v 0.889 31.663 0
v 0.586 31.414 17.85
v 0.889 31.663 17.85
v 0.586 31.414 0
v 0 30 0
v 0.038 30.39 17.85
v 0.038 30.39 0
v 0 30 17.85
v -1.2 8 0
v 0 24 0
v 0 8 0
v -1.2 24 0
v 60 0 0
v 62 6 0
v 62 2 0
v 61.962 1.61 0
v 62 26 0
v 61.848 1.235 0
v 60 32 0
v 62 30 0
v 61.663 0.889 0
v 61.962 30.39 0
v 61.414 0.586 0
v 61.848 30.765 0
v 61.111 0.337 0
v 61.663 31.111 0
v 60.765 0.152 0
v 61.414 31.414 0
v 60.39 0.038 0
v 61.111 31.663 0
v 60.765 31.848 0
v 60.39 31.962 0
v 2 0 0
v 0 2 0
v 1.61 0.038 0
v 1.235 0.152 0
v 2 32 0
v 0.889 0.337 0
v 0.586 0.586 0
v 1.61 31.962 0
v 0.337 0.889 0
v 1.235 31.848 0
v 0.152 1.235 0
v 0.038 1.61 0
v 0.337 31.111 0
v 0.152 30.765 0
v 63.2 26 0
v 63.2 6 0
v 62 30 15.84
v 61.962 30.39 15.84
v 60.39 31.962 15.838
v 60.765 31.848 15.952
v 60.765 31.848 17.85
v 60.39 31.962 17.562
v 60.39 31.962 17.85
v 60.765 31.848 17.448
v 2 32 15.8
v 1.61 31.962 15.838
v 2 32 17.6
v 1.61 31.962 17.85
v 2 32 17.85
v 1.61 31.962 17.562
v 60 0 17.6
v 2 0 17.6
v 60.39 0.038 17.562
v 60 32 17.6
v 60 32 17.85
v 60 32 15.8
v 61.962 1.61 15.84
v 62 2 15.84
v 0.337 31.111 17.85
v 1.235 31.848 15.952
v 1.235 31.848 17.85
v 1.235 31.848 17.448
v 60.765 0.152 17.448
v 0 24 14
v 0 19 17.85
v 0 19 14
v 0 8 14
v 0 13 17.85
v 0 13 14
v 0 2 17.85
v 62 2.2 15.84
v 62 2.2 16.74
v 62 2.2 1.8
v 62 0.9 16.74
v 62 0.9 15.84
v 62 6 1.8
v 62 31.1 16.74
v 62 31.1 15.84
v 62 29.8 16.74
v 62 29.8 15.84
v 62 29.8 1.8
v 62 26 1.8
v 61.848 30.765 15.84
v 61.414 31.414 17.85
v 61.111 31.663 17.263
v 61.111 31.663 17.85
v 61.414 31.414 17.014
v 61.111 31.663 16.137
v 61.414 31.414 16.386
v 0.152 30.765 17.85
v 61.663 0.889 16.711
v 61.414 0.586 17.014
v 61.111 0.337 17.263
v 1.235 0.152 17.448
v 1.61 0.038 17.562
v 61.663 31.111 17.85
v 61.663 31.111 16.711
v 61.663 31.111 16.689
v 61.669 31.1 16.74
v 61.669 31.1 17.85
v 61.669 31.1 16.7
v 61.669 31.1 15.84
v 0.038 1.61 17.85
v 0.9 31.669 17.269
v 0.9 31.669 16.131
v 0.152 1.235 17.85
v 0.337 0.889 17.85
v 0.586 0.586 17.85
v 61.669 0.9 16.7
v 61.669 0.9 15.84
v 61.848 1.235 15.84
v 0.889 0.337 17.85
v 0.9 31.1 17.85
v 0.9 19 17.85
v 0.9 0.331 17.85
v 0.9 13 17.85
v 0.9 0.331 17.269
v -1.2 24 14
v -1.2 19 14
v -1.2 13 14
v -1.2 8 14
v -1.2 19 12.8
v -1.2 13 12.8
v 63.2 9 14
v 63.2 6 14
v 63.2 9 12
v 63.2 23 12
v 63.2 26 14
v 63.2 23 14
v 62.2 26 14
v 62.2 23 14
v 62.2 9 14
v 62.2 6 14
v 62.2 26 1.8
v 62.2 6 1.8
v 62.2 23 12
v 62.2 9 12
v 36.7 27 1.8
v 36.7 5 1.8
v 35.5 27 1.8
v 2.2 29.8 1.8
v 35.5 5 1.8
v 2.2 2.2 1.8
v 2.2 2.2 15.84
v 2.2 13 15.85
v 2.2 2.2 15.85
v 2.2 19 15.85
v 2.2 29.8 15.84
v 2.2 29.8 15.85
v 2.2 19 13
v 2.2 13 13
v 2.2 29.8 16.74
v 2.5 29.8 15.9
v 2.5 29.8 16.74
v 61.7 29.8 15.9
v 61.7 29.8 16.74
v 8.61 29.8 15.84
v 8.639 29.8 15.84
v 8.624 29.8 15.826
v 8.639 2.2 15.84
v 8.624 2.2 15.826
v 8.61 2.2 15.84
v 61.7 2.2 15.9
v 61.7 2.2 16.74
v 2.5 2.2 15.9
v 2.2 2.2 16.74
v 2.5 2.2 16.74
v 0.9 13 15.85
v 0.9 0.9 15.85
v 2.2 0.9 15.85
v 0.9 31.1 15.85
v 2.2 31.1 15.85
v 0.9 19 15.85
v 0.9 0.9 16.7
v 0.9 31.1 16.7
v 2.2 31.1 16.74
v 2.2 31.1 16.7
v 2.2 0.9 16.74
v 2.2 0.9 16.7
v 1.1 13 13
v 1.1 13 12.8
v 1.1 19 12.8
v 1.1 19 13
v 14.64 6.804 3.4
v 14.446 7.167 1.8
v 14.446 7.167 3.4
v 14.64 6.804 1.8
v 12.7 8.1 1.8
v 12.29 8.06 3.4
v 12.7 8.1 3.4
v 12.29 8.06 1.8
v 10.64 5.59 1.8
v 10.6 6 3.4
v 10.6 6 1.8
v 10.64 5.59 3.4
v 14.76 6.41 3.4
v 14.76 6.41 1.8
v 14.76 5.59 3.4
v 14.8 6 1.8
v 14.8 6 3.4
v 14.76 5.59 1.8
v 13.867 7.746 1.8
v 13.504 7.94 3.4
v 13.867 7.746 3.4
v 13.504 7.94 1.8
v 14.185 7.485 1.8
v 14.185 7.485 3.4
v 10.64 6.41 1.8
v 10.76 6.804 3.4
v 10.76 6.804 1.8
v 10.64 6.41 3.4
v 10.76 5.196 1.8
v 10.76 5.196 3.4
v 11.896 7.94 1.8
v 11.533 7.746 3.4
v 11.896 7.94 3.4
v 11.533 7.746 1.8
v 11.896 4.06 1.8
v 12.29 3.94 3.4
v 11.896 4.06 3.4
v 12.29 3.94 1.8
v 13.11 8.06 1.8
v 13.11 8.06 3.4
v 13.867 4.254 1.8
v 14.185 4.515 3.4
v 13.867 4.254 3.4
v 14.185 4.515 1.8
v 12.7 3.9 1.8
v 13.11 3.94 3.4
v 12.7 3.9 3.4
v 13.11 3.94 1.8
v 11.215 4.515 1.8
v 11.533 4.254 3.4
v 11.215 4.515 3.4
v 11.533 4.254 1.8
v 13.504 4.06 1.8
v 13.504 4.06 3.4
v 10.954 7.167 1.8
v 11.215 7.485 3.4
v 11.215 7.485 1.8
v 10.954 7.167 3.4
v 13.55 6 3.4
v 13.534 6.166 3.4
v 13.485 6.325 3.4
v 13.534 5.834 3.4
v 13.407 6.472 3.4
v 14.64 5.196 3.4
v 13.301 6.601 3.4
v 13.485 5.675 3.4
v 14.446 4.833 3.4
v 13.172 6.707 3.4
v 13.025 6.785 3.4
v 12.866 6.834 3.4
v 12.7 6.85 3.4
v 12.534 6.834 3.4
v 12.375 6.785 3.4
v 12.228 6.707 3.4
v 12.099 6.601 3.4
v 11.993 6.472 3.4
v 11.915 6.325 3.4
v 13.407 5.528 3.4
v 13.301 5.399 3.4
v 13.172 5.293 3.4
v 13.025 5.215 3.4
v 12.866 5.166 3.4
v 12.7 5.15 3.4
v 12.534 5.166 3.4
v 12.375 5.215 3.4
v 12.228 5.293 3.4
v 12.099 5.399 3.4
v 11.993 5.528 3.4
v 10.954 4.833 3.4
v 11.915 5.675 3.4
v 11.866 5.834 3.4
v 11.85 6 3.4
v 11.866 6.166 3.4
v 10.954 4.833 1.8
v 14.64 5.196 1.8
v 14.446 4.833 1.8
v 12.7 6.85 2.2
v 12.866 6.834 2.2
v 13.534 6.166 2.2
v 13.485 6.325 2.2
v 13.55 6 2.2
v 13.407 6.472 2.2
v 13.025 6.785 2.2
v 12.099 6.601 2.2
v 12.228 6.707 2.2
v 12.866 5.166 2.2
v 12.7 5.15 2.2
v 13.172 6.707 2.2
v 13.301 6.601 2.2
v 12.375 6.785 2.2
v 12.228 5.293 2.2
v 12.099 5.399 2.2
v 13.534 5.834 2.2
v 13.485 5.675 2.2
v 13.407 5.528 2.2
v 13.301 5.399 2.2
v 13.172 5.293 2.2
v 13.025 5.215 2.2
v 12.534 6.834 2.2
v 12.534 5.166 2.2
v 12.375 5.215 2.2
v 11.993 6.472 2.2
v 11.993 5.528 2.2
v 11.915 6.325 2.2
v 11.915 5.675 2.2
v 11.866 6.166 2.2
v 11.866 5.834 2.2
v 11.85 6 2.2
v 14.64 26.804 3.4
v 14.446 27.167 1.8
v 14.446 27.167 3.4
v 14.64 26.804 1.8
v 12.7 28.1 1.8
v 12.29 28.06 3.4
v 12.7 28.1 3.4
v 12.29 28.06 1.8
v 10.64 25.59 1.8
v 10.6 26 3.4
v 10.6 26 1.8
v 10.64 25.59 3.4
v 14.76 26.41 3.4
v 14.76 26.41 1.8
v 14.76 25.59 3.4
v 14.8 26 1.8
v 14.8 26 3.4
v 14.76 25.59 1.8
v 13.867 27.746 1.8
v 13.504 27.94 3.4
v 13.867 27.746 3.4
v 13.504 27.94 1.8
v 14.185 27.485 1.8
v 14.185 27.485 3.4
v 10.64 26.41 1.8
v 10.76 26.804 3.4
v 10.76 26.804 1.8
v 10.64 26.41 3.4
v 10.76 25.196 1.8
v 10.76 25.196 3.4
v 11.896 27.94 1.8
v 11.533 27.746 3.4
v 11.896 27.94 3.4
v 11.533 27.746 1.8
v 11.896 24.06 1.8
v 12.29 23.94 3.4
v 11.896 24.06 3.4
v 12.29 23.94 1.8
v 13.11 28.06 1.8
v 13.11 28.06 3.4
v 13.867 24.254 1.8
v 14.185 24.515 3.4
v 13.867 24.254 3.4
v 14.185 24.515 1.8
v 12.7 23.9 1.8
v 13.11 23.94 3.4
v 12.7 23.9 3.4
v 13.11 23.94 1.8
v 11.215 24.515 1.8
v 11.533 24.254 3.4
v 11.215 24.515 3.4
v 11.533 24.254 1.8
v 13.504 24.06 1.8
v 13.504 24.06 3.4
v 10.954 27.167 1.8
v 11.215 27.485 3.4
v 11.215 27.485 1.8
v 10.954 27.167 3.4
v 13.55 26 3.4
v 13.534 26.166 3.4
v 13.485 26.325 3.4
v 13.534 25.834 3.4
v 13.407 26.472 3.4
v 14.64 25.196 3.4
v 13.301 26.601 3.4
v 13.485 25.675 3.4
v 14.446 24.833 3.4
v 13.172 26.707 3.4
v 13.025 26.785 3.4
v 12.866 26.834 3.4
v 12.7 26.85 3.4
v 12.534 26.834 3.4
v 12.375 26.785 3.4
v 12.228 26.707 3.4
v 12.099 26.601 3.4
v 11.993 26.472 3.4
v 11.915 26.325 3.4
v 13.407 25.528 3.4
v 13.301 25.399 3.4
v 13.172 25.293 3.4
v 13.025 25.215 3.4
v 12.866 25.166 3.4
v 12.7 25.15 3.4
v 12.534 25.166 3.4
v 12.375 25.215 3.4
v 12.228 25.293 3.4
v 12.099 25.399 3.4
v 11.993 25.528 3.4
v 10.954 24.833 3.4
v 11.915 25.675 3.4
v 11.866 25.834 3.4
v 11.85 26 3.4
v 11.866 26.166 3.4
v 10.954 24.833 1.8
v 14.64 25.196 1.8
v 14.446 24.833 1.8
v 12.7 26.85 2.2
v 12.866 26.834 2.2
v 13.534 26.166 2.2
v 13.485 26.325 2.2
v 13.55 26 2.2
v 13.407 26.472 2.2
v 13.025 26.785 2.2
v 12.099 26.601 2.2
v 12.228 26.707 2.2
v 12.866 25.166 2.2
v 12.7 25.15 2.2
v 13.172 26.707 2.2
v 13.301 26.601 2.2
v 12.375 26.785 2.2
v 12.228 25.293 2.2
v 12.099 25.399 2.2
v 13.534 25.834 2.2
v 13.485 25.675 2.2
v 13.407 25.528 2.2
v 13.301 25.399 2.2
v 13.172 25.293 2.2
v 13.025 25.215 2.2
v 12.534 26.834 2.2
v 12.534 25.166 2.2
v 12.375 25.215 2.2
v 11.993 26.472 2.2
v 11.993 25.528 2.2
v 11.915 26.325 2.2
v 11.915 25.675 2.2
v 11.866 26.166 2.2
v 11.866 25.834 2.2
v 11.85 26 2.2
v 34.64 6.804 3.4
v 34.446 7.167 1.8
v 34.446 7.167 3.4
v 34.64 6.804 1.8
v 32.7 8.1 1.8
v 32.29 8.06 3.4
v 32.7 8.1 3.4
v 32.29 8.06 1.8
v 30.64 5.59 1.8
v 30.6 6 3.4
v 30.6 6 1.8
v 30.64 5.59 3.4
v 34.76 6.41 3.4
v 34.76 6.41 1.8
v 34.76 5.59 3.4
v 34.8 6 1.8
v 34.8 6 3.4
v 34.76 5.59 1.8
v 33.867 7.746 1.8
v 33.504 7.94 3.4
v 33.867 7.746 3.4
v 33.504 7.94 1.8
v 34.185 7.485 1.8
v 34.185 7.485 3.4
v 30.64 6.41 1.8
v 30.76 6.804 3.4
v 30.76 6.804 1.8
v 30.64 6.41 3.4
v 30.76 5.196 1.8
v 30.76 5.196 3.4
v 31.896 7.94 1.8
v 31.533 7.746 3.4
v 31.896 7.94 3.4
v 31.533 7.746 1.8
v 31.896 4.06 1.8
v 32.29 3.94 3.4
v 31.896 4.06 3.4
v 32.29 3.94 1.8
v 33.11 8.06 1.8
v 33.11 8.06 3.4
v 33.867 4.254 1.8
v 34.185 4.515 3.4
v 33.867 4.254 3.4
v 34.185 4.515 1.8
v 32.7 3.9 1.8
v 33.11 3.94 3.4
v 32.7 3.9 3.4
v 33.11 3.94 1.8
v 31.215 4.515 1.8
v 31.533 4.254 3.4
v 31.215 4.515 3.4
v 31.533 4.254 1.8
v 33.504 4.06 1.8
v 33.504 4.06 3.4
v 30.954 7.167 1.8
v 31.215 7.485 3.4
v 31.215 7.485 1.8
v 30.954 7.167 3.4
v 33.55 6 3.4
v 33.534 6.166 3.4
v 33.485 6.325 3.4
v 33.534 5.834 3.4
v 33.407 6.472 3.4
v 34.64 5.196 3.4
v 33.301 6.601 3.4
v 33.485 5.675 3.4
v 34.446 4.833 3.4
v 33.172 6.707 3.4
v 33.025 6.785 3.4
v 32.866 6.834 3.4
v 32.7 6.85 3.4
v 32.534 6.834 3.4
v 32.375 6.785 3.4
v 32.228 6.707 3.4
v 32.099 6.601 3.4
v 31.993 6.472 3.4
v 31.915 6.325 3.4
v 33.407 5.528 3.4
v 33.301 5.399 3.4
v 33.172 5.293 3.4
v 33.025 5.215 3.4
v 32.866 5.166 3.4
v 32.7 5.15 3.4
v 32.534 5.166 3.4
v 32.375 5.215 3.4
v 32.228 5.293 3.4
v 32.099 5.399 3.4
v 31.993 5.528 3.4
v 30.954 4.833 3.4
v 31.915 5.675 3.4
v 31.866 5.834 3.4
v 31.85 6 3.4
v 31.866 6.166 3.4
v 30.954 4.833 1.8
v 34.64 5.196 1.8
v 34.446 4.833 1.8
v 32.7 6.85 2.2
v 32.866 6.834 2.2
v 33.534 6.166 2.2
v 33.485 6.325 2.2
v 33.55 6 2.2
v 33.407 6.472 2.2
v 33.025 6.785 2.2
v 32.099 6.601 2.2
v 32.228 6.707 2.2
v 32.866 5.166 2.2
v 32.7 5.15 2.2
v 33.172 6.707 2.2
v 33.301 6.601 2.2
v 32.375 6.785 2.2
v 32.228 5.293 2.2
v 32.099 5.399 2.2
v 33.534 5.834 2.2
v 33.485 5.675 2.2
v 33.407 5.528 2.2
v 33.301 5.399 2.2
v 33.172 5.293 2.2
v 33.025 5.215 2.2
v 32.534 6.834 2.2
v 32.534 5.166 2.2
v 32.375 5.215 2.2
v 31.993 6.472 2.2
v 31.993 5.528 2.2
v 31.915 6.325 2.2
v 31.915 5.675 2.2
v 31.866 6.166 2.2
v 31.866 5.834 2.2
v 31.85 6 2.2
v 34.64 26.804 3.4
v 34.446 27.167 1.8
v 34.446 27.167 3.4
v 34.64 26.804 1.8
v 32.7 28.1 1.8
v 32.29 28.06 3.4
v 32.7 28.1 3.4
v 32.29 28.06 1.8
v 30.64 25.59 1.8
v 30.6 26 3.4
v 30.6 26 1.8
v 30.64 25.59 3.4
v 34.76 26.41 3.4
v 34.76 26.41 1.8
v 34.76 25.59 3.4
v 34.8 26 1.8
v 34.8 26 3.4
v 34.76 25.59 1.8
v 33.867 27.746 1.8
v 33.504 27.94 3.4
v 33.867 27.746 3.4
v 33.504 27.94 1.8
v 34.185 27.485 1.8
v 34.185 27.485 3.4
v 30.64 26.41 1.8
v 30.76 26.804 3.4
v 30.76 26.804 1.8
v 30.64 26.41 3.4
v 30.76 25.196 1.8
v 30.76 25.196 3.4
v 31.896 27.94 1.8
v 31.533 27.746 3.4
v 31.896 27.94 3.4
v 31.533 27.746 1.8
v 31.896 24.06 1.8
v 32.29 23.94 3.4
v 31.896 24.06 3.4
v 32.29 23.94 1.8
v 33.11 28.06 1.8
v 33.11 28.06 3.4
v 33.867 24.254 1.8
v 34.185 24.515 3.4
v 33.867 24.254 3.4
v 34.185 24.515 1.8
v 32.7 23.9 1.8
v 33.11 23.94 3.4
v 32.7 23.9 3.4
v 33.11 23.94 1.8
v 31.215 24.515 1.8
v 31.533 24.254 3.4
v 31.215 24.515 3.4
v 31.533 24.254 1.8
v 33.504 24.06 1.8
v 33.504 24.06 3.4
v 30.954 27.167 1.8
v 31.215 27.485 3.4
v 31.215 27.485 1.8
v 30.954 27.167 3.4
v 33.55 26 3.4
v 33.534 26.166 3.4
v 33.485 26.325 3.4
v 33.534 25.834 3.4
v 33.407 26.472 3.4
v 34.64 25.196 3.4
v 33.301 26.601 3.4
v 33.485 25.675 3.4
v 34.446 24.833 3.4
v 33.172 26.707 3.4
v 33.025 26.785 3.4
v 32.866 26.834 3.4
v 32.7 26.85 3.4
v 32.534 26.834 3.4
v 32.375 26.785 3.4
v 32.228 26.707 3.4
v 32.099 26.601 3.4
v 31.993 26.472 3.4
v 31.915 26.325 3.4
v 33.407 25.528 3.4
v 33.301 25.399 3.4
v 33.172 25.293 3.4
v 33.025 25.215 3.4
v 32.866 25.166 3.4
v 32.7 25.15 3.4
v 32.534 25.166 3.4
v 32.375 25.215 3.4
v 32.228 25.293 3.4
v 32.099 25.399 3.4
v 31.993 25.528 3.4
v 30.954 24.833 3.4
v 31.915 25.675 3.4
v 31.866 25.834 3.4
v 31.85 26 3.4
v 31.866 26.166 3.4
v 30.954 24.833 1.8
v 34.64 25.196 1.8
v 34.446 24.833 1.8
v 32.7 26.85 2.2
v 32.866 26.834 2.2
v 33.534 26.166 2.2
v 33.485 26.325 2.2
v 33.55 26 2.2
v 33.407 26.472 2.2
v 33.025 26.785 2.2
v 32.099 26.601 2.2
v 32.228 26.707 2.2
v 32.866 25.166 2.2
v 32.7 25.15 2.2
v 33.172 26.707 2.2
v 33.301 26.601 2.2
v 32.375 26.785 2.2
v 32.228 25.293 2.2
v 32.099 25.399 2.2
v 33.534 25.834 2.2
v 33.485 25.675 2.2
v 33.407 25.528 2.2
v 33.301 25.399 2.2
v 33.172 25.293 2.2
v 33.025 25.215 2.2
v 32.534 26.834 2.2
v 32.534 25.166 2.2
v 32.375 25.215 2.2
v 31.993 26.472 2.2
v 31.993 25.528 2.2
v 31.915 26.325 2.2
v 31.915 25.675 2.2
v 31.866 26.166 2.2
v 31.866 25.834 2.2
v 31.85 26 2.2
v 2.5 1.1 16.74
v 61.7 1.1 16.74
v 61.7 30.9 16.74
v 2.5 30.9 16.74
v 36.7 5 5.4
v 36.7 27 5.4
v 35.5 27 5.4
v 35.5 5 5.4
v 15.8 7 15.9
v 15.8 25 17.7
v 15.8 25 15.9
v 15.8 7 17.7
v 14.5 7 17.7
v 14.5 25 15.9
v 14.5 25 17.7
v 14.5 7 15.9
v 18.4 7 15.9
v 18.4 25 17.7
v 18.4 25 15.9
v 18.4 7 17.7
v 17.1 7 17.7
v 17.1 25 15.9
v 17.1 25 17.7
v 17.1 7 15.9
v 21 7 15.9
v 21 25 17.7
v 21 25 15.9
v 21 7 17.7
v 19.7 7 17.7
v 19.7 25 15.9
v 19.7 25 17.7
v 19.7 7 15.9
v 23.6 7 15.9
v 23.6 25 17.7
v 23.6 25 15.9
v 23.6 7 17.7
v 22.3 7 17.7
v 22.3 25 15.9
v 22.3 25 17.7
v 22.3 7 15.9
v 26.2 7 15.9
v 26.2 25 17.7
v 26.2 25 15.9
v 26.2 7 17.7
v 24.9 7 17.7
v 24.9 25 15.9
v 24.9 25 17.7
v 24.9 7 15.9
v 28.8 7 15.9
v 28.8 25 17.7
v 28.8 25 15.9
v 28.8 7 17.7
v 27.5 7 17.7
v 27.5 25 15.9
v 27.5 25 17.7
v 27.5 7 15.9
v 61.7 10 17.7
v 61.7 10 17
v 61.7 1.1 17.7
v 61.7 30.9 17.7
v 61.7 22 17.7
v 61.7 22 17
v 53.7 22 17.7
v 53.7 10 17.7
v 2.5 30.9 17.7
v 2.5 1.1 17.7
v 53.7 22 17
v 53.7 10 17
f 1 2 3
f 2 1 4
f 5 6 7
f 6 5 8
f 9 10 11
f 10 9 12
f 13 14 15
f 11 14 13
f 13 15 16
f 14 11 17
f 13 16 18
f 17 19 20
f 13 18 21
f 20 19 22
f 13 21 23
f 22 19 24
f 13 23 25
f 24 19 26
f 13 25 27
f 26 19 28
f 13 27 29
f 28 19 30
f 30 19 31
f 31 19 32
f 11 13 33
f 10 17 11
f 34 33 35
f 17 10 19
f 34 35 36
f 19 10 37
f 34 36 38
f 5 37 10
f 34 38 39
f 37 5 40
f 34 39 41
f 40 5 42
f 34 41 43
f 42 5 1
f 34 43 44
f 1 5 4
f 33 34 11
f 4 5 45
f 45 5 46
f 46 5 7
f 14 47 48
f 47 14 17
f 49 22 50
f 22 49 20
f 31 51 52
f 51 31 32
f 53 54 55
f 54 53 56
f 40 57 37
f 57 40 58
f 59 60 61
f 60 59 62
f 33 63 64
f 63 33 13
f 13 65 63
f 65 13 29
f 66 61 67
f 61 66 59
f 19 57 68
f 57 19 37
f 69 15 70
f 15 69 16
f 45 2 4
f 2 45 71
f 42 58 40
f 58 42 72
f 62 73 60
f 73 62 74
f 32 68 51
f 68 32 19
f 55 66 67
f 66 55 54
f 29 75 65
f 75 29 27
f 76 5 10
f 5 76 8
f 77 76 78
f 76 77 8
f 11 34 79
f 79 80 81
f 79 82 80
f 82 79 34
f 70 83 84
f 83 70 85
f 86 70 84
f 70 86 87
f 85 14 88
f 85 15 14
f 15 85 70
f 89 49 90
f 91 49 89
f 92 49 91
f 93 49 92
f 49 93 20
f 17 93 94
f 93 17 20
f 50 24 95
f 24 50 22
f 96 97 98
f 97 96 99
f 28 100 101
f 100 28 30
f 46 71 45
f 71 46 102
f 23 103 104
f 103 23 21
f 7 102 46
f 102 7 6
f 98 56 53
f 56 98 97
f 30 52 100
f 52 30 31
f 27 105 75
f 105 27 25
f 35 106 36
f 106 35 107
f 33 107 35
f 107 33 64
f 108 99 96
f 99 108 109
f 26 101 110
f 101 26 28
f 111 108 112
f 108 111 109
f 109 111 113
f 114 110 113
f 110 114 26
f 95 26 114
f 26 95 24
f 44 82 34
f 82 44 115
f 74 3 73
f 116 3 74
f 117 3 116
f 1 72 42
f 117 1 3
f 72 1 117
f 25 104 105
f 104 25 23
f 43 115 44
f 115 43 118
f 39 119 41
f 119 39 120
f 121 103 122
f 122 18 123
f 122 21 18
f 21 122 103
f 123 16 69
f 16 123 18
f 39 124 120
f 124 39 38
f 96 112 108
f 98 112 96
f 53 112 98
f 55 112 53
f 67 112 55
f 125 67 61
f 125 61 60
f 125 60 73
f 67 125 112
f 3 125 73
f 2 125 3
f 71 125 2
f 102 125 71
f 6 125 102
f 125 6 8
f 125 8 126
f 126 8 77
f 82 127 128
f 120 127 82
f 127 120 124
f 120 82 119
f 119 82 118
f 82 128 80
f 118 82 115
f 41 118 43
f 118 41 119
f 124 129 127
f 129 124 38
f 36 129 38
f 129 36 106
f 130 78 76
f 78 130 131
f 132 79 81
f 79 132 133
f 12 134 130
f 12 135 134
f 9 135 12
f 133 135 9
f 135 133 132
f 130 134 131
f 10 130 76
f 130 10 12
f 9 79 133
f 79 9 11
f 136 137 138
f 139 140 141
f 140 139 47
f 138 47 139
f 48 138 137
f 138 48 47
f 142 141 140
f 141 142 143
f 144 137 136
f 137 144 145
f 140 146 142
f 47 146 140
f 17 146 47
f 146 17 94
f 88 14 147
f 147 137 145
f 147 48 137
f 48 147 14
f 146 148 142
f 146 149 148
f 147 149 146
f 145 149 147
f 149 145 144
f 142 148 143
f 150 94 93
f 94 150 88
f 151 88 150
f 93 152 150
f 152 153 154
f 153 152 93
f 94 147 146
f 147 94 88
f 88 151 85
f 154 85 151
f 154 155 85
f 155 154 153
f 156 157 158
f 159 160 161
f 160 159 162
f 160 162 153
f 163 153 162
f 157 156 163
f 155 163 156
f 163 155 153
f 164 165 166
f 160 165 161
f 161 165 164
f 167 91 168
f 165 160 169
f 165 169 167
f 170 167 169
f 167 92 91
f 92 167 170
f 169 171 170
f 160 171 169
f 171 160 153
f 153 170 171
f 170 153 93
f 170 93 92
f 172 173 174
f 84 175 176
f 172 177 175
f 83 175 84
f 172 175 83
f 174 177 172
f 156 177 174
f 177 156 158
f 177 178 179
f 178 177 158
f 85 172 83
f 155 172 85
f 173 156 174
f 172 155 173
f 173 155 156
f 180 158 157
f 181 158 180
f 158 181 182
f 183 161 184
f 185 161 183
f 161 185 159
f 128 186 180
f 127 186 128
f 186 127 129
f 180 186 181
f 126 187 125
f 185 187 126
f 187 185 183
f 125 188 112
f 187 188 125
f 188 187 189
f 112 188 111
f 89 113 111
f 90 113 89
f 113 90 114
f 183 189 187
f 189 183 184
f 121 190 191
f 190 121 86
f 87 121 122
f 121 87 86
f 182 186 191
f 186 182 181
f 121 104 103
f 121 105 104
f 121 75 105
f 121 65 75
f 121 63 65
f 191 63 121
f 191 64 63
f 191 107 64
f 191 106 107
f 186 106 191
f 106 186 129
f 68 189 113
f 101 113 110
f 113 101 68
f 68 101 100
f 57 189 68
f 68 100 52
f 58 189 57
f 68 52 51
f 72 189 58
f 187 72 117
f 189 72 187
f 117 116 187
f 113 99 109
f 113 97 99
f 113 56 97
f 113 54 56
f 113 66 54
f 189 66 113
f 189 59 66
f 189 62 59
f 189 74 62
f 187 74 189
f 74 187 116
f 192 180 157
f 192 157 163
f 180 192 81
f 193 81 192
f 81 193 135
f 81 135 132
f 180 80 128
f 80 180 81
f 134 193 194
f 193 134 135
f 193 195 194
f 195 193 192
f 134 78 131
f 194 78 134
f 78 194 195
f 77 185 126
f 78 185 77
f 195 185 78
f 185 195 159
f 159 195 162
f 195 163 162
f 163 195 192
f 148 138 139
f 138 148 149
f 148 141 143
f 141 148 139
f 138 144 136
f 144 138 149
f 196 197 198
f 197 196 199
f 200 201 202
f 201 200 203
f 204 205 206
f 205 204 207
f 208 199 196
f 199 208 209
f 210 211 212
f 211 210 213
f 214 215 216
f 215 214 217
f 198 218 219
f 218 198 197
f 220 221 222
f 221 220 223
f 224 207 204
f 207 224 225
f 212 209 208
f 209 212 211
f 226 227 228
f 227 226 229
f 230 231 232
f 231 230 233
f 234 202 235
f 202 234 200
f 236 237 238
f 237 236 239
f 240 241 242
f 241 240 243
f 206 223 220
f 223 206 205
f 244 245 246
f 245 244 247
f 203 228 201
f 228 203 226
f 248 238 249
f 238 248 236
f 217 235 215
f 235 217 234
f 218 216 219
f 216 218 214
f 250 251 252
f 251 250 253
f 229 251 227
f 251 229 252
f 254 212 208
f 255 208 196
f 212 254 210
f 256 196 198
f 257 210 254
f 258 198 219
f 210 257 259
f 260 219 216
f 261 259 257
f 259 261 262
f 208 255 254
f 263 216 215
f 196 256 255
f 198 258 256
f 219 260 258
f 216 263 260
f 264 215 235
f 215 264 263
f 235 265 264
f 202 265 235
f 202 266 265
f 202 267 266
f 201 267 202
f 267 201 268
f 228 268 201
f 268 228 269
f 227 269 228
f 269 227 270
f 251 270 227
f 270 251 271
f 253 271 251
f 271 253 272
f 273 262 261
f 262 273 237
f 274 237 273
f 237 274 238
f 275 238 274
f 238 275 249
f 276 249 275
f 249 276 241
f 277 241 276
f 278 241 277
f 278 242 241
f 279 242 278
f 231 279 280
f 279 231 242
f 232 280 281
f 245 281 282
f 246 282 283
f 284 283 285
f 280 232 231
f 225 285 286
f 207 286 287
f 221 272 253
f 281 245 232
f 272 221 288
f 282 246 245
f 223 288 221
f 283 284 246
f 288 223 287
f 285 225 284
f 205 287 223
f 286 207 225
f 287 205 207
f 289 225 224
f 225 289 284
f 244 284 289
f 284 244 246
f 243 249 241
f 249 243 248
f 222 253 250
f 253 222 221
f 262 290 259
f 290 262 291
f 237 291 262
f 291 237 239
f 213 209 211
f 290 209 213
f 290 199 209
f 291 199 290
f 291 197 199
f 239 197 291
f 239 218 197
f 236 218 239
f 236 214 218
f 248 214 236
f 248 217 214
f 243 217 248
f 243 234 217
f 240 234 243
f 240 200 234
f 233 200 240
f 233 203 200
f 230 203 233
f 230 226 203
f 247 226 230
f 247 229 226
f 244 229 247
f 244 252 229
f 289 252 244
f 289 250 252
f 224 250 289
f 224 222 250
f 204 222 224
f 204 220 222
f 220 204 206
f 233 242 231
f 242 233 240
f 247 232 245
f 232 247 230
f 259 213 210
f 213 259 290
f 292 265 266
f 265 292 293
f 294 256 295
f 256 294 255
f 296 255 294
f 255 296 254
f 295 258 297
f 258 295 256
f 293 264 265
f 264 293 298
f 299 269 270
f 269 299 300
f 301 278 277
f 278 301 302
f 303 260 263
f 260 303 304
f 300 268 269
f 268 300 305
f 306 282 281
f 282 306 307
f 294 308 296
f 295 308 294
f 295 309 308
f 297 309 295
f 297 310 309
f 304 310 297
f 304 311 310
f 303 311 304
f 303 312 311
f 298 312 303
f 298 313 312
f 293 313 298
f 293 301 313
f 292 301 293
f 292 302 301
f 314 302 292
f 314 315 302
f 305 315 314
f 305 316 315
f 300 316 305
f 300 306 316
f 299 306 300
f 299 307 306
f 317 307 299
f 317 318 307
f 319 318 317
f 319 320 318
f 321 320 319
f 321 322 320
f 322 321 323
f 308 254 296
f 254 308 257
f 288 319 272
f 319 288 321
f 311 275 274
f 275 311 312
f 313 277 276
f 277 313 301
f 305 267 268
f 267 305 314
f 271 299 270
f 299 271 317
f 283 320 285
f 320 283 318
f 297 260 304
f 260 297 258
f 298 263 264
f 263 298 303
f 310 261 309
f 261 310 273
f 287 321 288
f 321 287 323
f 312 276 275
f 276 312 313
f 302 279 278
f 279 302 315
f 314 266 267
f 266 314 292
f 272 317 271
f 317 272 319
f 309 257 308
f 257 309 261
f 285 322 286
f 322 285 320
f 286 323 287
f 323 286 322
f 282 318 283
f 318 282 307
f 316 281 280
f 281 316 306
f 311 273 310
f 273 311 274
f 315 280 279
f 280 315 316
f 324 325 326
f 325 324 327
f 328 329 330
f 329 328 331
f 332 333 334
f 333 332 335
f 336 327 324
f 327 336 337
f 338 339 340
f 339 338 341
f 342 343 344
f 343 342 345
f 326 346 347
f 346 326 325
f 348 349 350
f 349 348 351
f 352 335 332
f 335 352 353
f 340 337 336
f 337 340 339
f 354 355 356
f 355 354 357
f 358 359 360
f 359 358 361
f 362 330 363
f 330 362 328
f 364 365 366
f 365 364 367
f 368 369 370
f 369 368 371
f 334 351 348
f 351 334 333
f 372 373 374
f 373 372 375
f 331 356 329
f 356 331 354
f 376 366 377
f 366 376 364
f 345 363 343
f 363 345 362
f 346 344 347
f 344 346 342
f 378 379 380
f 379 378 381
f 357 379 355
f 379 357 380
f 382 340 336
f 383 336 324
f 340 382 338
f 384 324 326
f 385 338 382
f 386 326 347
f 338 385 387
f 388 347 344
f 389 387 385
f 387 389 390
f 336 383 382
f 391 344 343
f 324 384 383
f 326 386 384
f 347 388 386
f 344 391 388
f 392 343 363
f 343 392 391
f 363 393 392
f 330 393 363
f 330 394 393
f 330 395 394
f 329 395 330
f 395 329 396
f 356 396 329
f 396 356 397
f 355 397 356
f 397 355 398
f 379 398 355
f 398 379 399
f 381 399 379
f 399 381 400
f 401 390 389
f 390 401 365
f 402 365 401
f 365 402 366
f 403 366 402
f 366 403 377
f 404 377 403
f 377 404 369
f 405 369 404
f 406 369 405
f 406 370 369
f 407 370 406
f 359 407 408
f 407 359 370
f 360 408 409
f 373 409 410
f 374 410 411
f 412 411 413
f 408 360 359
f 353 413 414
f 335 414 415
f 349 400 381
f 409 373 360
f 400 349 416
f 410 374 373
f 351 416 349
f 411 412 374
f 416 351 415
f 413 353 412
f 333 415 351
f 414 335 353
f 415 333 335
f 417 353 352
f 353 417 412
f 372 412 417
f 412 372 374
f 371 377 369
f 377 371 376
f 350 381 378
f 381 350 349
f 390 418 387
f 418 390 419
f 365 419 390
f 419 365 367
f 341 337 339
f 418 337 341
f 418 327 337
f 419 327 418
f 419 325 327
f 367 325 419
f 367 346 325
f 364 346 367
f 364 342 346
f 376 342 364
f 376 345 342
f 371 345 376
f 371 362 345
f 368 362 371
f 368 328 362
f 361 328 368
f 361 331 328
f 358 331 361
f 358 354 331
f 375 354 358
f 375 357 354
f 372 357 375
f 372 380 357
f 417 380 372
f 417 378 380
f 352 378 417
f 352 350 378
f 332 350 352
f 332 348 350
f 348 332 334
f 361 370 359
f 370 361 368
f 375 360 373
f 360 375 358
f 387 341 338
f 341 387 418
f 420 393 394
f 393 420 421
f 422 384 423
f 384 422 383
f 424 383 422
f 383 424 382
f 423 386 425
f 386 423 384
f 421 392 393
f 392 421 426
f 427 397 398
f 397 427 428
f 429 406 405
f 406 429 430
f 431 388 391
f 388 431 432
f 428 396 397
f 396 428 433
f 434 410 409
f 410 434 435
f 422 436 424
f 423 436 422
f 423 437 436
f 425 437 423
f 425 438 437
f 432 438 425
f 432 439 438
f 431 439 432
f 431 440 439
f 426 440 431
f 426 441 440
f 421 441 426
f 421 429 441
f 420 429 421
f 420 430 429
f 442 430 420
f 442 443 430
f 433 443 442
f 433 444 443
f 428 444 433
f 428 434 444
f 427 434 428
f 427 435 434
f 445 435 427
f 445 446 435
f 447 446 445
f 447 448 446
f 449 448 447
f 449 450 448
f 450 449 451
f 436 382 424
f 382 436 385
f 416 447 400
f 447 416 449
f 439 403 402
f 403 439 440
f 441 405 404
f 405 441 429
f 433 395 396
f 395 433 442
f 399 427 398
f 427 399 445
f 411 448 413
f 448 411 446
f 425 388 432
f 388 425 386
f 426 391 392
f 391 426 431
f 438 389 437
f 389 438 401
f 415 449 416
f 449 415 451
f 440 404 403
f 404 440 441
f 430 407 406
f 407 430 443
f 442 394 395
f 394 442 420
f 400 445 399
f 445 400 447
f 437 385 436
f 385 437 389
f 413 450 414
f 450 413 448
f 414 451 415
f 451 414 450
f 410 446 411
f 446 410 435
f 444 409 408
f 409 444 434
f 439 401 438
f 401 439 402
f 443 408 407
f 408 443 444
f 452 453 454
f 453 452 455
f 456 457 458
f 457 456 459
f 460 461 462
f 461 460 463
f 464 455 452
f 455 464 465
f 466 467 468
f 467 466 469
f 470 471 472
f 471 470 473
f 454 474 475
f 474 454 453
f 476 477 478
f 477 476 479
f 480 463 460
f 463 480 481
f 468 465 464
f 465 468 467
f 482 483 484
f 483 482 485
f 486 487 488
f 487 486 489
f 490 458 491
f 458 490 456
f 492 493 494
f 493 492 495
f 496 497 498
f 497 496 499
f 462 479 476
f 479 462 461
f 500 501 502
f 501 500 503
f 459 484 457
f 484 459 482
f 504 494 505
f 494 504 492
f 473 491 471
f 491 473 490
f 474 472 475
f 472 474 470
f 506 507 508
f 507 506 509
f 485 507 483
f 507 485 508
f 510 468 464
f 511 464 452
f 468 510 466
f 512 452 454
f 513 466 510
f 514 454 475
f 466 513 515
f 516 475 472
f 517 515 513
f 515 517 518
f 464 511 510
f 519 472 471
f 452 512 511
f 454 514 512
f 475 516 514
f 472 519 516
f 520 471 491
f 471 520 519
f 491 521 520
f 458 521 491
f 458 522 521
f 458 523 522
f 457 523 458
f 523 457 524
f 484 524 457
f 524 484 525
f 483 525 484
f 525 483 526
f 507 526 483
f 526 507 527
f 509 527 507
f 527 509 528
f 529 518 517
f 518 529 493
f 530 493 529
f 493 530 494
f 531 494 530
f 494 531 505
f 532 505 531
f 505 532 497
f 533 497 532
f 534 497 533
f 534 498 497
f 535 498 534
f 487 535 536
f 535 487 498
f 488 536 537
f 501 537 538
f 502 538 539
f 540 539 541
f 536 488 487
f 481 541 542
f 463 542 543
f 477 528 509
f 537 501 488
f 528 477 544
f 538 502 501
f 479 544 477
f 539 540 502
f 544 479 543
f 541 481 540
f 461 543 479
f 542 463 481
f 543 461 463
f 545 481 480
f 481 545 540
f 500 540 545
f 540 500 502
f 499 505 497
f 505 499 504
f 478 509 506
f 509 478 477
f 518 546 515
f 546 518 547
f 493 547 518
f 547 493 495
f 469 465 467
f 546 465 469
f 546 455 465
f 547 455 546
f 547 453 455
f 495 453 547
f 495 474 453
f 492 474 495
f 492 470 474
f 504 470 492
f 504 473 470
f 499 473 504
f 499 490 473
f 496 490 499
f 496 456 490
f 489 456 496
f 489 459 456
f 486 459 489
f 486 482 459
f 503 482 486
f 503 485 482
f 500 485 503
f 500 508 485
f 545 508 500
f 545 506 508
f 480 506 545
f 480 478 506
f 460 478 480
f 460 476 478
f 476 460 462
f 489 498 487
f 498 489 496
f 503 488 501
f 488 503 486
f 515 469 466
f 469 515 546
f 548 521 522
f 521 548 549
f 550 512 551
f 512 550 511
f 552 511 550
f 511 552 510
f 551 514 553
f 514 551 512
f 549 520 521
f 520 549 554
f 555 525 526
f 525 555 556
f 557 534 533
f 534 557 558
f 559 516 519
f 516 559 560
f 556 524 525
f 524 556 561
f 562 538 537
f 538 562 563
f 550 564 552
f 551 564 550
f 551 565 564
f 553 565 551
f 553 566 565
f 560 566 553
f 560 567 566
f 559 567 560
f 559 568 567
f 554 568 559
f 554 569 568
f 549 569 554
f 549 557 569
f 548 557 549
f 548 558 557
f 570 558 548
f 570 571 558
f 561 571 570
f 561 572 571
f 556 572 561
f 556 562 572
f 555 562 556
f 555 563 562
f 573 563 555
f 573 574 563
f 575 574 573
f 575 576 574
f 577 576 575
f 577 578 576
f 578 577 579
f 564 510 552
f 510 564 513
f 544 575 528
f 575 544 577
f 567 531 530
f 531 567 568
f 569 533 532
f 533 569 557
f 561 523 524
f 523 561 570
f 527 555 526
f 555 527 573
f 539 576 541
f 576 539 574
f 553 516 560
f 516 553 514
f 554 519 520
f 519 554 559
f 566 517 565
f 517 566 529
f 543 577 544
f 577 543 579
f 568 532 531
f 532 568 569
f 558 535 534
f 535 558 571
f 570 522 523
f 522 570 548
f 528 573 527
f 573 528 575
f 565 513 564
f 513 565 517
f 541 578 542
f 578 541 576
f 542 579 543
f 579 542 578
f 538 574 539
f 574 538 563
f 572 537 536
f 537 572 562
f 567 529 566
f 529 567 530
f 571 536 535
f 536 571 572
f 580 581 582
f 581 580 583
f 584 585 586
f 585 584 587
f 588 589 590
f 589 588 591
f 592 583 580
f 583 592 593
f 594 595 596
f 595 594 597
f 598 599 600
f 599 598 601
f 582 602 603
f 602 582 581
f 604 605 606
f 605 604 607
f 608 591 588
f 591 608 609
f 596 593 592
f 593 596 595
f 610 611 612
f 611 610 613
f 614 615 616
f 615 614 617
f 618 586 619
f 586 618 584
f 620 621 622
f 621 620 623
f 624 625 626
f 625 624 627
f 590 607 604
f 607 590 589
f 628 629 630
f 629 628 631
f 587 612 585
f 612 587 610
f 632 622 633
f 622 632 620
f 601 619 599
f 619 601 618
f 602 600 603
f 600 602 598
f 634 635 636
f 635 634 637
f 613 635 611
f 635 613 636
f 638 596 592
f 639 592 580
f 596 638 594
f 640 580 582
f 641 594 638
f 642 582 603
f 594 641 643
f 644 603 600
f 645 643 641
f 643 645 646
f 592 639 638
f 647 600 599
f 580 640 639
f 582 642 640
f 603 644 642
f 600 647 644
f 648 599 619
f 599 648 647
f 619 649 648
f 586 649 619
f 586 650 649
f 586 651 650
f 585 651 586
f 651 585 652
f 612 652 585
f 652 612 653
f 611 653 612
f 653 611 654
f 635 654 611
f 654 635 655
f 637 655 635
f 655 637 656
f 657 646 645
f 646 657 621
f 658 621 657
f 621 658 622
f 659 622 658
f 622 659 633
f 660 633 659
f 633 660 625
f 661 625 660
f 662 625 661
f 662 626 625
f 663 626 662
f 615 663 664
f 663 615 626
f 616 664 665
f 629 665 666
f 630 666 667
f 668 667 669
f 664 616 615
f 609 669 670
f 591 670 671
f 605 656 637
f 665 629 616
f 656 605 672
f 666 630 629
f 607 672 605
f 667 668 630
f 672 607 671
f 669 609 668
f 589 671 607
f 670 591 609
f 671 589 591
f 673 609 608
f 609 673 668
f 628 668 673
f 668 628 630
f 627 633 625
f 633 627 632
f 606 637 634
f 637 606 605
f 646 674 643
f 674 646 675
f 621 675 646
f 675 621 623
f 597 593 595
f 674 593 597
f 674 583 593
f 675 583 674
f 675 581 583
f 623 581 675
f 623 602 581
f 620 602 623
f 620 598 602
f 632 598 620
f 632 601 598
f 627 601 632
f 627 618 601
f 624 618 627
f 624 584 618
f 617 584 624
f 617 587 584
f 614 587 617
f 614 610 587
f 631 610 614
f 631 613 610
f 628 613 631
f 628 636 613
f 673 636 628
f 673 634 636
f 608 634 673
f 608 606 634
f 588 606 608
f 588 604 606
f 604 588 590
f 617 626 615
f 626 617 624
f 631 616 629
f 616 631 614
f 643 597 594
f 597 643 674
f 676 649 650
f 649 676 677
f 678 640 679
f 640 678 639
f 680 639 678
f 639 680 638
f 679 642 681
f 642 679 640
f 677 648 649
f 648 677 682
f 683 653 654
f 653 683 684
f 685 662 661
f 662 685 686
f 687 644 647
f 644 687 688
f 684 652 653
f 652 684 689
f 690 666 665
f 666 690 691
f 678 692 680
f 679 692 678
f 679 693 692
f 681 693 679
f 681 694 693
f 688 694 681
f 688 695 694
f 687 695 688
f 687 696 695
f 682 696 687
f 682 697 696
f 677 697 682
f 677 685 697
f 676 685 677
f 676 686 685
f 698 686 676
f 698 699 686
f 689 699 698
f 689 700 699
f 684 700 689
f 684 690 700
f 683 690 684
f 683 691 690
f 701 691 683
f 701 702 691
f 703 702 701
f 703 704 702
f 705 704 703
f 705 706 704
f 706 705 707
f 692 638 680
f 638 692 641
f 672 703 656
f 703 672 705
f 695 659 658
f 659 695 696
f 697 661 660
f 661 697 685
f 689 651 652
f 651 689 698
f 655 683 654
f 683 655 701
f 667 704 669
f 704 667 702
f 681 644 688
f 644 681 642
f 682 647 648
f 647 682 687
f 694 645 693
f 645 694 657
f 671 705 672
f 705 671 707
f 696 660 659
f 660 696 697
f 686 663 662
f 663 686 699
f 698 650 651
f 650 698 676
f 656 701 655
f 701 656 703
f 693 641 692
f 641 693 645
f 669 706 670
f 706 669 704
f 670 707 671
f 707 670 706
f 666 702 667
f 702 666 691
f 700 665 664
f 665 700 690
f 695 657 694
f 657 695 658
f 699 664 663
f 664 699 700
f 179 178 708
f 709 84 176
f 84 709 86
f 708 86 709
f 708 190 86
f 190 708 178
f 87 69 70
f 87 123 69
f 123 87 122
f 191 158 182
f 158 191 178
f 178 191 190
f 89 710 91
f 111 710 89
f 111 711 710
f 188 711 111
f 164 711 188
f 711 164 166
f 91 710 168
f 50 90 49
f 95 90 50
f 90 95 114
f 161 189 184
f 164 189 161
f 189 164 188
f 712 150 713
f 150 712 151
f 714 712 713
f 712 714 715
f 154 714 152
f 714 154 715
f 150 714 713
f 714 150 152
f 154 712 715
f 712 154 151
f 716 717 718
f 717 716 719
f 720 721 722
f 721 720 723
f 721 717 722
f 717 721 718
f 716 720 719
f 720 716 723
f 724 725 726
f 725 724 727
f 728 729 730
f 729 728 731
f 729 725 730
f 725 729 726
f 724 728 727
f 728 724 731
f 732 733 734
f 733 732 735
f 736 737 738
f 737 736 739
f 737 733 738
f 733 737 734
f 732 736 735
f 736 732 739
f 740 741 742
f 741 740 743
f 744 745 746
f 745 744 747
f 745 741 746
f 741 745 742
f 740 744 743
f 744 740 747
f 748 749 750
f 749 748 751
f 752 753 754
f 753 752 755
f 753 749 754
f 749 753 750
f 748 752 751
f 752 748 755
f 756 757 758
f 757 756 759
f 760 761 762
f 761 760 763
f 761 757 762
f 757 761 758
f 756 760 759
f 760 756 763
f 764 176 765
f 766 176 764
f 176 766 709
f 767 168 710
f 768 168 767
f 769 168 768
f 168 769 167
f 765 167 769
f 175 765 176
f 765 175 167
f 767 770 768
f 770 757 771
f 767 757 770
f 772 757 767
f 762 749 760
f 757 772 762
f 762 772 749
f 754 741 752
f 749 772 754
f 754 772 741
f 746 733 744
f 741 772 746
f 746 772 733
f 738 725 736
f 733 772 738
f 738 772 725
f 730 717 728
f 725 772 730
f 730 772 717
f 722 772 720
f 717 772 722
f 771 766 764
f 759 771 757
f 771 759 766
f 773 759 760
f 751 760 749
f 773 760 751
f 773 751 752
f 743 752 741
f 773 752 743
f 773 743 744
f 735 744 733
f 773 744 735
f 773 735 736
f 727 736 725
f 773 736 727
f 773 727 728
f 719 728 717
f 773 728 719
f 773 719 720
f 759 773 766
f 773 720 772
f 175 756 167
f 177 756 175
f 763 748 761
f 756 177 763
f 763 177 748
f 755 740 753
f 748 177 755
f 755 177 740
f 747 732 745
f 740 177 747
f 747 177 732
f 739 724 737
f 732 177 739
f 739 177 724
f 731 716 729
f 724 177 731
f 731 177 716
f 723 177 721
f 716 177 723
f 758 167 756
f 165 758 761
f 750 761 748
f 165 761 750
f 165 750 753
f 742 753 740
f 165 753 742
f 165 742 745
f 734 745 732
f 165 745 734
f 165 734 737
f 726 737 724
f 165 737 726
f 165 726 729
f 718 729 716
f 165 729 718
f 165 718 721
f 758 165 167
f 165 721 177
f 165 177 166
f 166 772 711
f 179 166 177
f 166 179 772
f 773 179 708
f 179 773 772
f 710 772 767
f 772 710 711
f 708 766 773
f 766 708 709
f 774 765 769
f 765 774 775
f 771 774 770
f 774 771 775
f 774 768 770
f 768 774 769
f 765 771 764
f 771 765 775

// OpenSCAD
// SmartKiln — cápsula PLA con tapa corredera para MAX31855
// ========================================================
// Placa objetivo: breakout genérico azul MAX6675/MAX31855,
// 25 x 25 mm, 4 agujeros M2 (paso 20 mm), borne 2 pines + header 5 pines.
//
// Imprimir en PLA, 0.2 mm, 3 perímetros, 25 % infill, sin soportes:
//   Base  → cara inferior sobre la cama
//   Tapa  → cara superior (ranuras) sobre la cama
//
// Verificar con calibre PCB_L / PCB_W / DUPONT_EXTRA antes de imprimir
// la pieza final. El resto escala solo.

$fn = 32;

// ---- Placa y conectores (medidos / típicos del módulo de las fotos) ----
PCB_L          = 25.0;   // largo, borne → header
PCB_W          = 25.0;
PCB_T          = 1.6;
HOLE_D         = 2.2;    // paso M2
HOLE_INSET     =  2.5;   // centro del agujero desde el borde → paso 20 mm
STANDOFF_H     =  1.6;
STANDOFF_D     =  4.2;

TERM_H         = 10.5;   // borne verde sobre la placa
DUPONT_EXTRA   = 16.0;   // housing Dupont 5P más allá del borde del PCB
DUPONT_H       =  9.5;
DUPONT_W       = 14.0;

TC_RELIEF      =  8.0;   // holgura de cables entre pared TC y PCB

// ---- Caja (números redondos para imprimir) ----
OUTER_L        = 62.0;
OUTER_W        = 32.0;
OUTER_H        = 18.0;
WALL           =  2.2;
FLOOR          =  1.8;
CLEAR          =  0.70;  // holgura PLA alrededor del PCB

LID_T          =  1.8;
GROOVE_D       =  1.3;   // profundidad del riel
GROOVE_Z_CLEAR =  0.35;  // holgura vertical de la tapa
LID_XY_CLEAR   =  0.40;

TC_SLOT_W      =  6.0;
TC_SLOT_H      =  5.0;
SPI_SLOT_W     = 14.0;
SPI_SLOT_H     =  6.0;

VENT_N         =  6;
VENT_L         = 18.0;
VENT_W         =  1.3;
VENT_PITCH     =  2.6;

DETENT         =  0.30;  // resalto chaflanado, no gancho

// ---- derivados ----
INNER_W = OUTER_W - 2 * WALL;
INNER_H = OUTER_H - FLOOR;
PCB_X   = WALL + TC_RELIEF;
PCB_Y   = (OUTER_W - PCB_W) / 2;
LID_Z   = FLOOR + INNER_H - LID_T - GROOVE_Z_CLEAR;
GROOVE_H = LID_T + GROOVE_Z_CLEAR;
LID_W   = INNER_W + 2 * GROOVE_D - LID_XY_CLEAR;
LID_L   = OUTER_L - WALL - 0.6;

echo("INNER_W", INNER_W, "INNER_H", INNER_H, "LID_W", LID_W, "LID_L", LID_L);

module rrect(l, w, h, r) {
    r = min(r, w / 2 - 0.05, l / 2 - 0.05);
    hull() {
        translate([r, r, 0]) cylinder(h = h, r = r);
        translate([l - r, r, 0]) cylinder(h = h, r = r);
        translate([r, w - r, 0]) cylinder(h = h, r = r);
        translate([l - r, w - r, 0]) cylinder(h = h, r = r);
    }
}

module u_slot(w, h, t) {
    translate([-w / 2, 0, -0.2]) cube([w, t + 0.4, h + 0.2]);
}

module base() {
    difference() {
        union() {
            rrect(OUTER_L, OUTER_W, OUTER_H - 0.15, 2.0);
            // peines exteriores de alivio (solo textura / agarre)
            translate([-1.2, (OUTER_W - 16) / 2, 0])
                cube([1.2, 16, OUTER_H - 4]);
            translate([OUTER_L, (OUTER_W - 20) / 2, 0])
                cube([1.2, 20, OUTER_H - 4]);
        }

        // cavidad
        translate([WALL, WALL, FLOOR])
            cube([OUTER_L - WALL + 0.2, INNER_W, INNER_H + 1]);

        // rieles: ranura en las dos paredes largas
        translate([WALL - GROOVE_D, WALL - GROOVE_D, LID_Z])
            cube([OUTER_L, INNER_W + 2 * GROOVE_D, GROOVE_H]);

        // chaflán 45° de entrada (imprimible sin soportes)
        translate([WALL - GROOVE_D, WALL - GROOVE_D, OUTER_H - 1.3])
            rotate([45, 0, 0])
                cube([OUTER_L, 2.2, 2.2]);
        translate([WALL - GROOVE_D, OUTER_W - WALL + GROOVE_D, OUTER_H - 1.3])
            rotate([-45, 0, 0])
                cube([OUTER_L, 2.2, 2.2]);

        // U termocupla (pared cerrada)
        translate([WALL / 2, OUTER_W / 2, FLOOR + INNER_H - TC_SLOT_H])
            rotate([0, 0, 90])
                u_slot(TC_SLOT_W, TC_SLOT_H + 1, WALL + 3);

        translate([0, OUTER_W / 2 - TC_SLOT_W / 2, FLOOR + INNER_H - TC_SLOT_H])
            cube([WALL + 0.4, TC_SLOT_W, TC_SLOT_H + 2]);

        // U SPI (extremo abierto, tapa sale por acá)
        translate([OUTER_L - 2.5, OUTER_W / 2 - SPI_SLOT_W / 2, FLOOR + INNER_H - SPI_SLOT_H])
            cube([4, SPI_SLOT_W, SPI_SLOT_H + 2]);
    }

    // piso de la ranura (estante) — se imprime sólido
    translate([WALL, WALL - GROOVE_D, LID_Z - 0.01])
        cube([OUTER_L - WALL, GROOVE_D, 0.9]);
    translate([WALL, WALL + INNER_W, LID_Z - 0.01])
        cube([OUTER_L - WALL, GROOVE_D, 0.9]);

    // postes de la placa (no hace falta tornillo; tapa no los aprieta)
    for (ix = [HOLE_INSET, PCB_L - HOLE_INSET])
        for (iy = [HOLE_INSET, PCB_W - HOLE_INSET])
            translate([PCB_X + ix, PCB_Y + iy, FLOOR])
                difference() {
                    cylinder(h = STANDOFF_H, d = STANDOFF_D);
                    translate([0, 0, 0.4])
                        cylinder(h = STANDOFF_H, d = 1.7);
                }

    // tope de la placa: no se va con el Dupont al abrir la tapa
    translate([PCB_X + PCB_L + 0.3, PCB_Y + 1.5, FLOOR])
        cube([1.2, PCB_W - 3.0, STANDOFF_H + PCB_T + 0.4]);

    // resalto de detent (chaflán, flexión < 0.3 mm)
    translate([WALL + 6, WALL - GROOVE_D, LID_Z + 0.4])
        rotate([0, 45, 0]) cube([DETENT * 2, GROOVE_D, DETENT * 2]);
    translate([WALL + 6, WALL + INNER_W, LID_Z + 0.4])
        rotate([0, 45, 0]) cube([DETENT * 2, GROOVE_D, DETENT * 2]);
}

module lid() {
    difference() {
        translate([0, (OUTER_W - LID_W) / 2, 0])
            cube([LID_L, LID_W, LID_T]);

        // ranuras de ventilación sobre el IC (junta fría)
        vent0 = PCB_X + 4 - WALL;
        for (i = [0 : VENT_N - 1])
            translate([
                vent0,
                (OUTER_W - VENT_L) / 2,
                -0.2
            ])
                translate([i * VENT_PITCH, 0, 0])
                    cube([VENT_W, VENT_L, LID_T + 0.4]);

        // muesca de uña, extremo SPI
        translate([LID_L - 8, OUTER_W / 2 - 6, LID_T - 0.7])
            cube([8.2, 12, 1.0]);
    }
}

// ensamble de referencia (no imprimir junto)
module preview() {
    color([0.22, 0.22, 0.24]) base();
    color([0.28, 0.28, 0.30])
        translate([WALL + 0.3, 0, LID_Z + 0.05])
            lid();
}

preview();
// Para exportar STL por separado, comentar preview() y descomentar uno:
// base();
// translate([0, OUTER_W + 8, 0]) lid();
